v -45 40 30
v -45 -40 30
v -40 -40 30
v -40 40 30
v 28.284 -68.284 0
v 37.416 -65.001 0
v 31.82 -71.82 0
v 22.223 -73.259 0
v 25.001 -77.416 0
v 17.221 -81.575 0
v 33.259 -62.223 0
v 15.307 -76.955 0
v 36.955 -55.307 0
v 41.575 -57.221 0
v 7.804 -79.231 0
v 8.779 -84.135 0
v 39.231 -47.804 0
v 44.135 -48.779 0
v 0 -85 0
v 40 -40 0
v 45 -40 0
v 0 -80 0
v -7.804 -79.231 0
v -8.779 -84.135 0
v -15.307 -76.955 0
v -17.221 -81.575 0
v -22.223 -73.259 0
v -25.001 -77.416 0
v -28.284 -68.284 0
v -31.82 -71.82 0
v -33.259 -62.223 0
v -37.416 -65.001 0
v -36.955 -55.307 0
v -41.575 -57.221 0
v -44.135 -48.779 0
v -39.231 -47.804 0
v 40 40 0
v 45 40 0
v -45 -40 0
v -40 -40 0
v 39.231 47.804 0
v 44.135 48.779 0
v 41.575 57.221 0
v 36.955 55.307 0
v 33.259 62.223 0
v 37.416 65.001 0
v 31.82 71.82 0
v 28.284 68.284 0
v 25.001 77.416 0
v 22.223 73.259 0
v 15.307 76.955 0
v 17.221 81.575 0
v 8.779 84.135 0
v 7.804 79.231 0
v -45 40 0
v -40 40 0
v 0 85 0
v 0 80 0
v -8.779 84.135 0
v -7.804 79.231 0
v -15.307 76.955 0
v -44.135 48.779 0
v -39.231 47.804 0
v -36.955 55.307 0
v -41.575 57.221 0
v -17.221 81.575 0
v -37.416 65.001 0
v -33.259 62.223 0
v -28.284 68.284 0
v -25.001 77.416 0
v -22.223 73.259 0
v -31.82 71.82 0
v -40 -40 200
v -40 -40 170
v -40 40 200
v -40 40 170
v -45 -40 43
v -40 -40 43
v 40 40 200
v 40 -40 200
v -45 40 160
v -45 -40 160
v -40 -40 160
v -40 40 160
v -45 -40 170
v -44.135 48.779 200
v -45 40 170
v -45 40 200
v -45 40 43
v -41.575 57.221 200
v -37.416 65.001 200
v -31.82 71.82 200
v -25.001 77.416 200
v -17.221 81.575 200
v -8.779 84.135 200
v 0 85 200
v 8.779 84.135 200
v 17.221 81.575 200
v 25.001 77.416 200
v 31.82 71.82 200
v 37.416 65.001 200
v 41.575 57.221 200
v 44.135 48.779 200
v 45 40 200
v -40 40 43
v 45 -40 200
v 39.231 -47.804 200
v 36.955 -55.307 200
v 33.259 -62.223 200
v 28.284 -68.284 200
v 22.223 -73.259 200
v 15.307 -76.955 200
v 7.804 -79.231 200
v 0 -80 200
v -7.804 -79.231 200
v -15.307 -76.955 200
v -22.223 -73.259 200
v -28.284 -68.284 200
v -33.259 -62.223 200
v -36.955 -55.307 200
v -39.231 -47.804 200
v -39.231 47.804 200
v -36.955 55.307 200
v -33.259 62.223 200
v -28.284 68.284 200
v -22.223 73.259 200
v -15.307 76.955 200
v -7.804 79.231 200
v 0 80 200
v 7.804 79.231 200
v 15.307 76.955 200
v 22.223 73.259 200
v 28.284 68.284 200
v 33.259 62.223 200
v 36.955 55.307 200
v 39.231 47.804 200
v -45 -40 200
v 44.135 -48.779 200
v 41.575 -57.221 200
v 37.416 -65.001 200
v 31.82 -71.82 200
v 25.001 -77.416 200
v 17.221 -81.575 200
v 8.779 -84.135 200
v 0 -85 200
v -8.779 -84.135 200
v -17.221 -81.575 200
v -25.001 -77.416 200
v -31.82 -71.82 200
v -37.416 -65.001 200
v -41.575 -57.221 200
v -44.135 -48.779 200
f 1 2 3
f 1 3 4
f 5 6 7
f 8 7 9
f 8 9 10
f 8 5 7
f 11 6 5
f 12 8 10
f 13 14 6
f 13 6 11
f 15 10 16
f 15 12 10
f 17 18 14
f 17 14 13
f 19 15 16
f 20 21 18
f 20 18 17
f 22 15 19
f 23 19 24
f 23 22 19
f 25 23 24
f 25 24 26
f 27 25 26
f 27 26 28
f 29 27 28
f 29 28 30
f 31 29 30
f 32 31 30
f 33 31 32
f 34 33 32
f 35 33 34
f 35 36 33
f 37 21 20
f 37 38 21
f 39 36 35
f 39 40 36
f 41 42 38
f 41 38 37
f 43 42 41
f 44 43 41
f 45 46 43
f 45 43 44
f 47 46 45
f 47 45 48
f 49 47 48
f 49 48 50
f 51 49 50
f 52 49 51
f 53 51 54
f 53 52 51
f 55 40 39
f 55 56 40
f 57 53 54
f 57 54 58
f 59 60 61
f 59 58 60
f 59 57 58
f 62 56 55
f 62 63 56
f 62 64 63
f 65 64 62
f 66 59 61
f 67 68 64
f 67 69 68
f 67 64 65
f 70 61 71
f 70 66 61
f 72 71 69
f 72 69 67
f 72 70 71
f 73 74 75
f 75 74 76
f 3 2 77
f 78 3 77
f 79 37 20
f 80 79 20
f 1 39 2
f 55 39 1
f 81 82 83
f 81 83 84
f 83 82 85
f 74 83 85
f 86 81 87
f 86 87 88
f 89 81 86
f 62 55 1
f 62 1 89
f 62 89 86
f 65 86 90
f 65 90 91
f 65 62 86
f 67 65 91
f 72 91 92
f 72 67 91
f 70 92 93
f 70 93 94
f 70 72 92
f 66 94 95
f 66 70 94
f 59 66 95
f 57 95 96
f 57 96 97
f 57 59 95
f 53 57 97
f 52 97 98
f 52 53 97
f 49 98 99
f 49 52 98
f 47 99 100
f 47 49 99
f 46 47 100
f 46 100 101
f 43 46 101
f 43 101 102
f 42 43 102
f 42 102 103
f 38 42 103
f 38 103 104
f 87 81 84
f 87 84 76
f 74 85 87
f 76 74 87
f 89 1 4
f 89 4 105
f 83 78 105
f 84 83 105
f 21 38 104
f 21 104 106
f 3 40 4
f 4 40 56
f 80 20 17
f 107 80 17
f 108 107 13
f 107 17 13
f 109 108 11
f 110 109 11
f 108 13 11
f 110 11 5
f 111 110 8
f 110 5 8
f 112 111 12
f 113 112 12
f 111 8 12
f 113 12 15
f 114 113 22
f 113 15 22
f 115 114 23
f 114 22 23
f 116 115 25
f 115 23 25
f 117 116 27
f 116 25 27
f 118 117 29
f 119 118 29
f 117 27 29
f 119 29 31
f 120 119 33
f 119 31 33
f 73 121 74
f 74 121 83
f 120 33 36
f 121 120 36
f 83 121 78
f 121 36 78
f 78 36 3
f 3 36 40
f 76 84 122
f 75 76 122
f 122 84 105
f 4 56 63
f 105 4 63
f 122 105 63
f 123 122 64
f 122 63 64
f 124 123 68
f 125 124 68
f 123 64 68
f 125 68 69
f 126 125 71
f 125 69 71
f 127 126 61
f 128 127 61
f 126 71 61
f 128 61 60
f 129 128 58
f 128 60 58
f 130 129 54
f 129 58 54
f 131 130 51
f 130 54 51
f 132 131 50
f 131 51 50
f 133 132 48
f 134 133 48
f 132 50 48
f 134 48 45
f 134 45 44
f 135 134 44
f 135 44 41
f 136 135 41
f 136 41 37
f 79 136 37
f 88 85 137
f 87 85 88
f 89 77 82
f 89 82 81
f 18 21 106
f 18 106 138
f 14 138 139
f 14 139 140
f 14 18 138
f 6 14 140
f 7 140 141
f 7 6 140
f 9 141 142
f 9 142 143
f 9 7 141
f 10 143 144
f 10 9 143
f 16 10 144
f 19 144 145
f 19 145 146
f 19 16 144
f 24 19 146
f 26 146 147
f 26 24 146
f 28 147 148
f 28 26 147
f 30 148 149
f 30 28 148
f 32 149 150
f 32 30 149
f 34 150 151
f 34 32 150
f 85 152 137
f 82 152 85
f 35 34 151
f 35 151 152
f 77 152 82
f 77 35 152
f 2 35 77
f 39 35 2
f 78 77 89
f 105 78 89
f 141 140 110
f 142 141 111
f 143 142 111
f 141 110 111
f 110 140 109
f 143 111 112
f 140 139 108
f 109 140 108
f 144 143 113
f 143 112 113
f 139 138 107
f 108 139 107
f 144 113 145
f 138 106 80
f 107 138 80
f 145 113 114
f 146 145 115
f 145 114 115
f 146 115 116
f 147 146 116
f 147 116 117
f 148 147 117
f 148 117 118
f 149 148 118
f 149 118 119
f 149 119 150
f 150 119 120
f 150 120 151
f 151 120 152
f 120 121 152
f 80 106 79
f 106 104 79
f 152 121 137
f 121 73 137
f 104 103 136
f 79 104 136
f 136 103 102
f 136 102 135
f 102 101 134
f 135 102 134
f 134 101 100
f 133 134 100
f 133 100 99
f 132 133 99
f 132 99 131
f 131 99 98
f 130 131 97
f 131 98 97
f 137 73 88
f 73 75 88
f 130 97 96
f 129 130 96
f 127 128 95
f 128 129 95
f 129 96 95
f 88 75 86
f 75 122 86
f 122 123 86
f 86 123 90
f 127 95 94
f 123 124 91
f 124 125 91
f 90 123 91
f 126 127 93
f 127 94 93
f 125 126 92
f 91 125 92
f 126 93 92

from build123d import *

# Parameters (mm, degrees)
EXTRUDE_355_DEPTH                 = 200
CUT_EXTRUDE_718_REACH             = 237.213
SKETCH_2_W                        = 13
SKETCH_2_H                        = 80
CUT_EXTRUDE_718_DIRECTION_2_DEPTH = 236.212669727
SKETCH_3_W                        = 10
SKETCH_3_H                        = 80
CUT_EXTRUDE_1071_DEPTH            = 5


with BuildPart() as part:
    # Эскиз1 → Extrude 355 (new body)
    with BuildSketch(Plane.XY):
        with BuildLine():
            Line((-45, -40), (-45, 40))
            ThreePointArc((-45, 40), (0, 85), (45, 40))
            Line((45, 40), (45, -40))
            ThreePointArc((45, -40), (0, -85), (-45, -40))
        make_face()
        with BuildLine():
            Line((-40, -40), (-40, 40))
            ThreePointArc((-40, 40), (0, 80), (40, 40))
            Line((40, 40), (40, -40))
            ThreePointArc((40, -40), (0, -80), (-40, -40))
        make_face(mode=Mode.SUBTRACT)
    extrude(amount=EXTRUDE_355_DEPTH)

    # Cut-Extrude 718: up to this face of the body (flat: up to its plane)
    cut_extrude_718_end = Plane(part.part.faces().sort_by_distance((-40, 0, 100))[0])
    # Эскиз2 → Cut-Extrude 718 (cut, up to the picked face)
    with BuildSketch(Plane.ZY.offset(45), mode=Mode.PRIVATE) as cut_extrude_718_sk1:
        with Locations((36.5, 0)):
            Rectangle(SKETCH_2_W, SKETCH_2_H)
    cut_extrude_718_tool1 = split(extrude(cut_extrude_718_sk1.sketch, amount=-CUT_EXTRUDE_718_REACH, mode=Mode.PRIVATE), bisect_by=cut_extrude_718_end, keep=Keep.BOTH, mode=Mode.PRIVATE)
    add(cut_extrude_718_tool1.solids().sort_by(Axis((-45, 0, 36.5), (1, 0, 0)))[0], mode=Mode.SUBTRACT)

    # Эскиз2 → Cut-Extrude 718 direction 2 (cut)
    with BuildSketch(Plane.ZY.offset(45)):
        with Locations((36.5, 0)):
            Rectangle(SKETCH_2_W, SKETCH_2_H)
    extrude(amount=CUT_EXTRUDE_718_DIRECTION_2_DEPTH, mode=Mode.SUBTRACT)

    # Эскиз3 → Cut-Extrude 1071 (cut)
    with BuildSketch(Plane.ZY.offset(45)):
        with Locations((165, 0)):
            Rectangle(SKETCH_3_W, SKETCH_3_H)
    extrude(amount=-CUT_EXTRUDE_1071_DEPTH, mode=Mode.SUBTRACT)


solid = part.part
